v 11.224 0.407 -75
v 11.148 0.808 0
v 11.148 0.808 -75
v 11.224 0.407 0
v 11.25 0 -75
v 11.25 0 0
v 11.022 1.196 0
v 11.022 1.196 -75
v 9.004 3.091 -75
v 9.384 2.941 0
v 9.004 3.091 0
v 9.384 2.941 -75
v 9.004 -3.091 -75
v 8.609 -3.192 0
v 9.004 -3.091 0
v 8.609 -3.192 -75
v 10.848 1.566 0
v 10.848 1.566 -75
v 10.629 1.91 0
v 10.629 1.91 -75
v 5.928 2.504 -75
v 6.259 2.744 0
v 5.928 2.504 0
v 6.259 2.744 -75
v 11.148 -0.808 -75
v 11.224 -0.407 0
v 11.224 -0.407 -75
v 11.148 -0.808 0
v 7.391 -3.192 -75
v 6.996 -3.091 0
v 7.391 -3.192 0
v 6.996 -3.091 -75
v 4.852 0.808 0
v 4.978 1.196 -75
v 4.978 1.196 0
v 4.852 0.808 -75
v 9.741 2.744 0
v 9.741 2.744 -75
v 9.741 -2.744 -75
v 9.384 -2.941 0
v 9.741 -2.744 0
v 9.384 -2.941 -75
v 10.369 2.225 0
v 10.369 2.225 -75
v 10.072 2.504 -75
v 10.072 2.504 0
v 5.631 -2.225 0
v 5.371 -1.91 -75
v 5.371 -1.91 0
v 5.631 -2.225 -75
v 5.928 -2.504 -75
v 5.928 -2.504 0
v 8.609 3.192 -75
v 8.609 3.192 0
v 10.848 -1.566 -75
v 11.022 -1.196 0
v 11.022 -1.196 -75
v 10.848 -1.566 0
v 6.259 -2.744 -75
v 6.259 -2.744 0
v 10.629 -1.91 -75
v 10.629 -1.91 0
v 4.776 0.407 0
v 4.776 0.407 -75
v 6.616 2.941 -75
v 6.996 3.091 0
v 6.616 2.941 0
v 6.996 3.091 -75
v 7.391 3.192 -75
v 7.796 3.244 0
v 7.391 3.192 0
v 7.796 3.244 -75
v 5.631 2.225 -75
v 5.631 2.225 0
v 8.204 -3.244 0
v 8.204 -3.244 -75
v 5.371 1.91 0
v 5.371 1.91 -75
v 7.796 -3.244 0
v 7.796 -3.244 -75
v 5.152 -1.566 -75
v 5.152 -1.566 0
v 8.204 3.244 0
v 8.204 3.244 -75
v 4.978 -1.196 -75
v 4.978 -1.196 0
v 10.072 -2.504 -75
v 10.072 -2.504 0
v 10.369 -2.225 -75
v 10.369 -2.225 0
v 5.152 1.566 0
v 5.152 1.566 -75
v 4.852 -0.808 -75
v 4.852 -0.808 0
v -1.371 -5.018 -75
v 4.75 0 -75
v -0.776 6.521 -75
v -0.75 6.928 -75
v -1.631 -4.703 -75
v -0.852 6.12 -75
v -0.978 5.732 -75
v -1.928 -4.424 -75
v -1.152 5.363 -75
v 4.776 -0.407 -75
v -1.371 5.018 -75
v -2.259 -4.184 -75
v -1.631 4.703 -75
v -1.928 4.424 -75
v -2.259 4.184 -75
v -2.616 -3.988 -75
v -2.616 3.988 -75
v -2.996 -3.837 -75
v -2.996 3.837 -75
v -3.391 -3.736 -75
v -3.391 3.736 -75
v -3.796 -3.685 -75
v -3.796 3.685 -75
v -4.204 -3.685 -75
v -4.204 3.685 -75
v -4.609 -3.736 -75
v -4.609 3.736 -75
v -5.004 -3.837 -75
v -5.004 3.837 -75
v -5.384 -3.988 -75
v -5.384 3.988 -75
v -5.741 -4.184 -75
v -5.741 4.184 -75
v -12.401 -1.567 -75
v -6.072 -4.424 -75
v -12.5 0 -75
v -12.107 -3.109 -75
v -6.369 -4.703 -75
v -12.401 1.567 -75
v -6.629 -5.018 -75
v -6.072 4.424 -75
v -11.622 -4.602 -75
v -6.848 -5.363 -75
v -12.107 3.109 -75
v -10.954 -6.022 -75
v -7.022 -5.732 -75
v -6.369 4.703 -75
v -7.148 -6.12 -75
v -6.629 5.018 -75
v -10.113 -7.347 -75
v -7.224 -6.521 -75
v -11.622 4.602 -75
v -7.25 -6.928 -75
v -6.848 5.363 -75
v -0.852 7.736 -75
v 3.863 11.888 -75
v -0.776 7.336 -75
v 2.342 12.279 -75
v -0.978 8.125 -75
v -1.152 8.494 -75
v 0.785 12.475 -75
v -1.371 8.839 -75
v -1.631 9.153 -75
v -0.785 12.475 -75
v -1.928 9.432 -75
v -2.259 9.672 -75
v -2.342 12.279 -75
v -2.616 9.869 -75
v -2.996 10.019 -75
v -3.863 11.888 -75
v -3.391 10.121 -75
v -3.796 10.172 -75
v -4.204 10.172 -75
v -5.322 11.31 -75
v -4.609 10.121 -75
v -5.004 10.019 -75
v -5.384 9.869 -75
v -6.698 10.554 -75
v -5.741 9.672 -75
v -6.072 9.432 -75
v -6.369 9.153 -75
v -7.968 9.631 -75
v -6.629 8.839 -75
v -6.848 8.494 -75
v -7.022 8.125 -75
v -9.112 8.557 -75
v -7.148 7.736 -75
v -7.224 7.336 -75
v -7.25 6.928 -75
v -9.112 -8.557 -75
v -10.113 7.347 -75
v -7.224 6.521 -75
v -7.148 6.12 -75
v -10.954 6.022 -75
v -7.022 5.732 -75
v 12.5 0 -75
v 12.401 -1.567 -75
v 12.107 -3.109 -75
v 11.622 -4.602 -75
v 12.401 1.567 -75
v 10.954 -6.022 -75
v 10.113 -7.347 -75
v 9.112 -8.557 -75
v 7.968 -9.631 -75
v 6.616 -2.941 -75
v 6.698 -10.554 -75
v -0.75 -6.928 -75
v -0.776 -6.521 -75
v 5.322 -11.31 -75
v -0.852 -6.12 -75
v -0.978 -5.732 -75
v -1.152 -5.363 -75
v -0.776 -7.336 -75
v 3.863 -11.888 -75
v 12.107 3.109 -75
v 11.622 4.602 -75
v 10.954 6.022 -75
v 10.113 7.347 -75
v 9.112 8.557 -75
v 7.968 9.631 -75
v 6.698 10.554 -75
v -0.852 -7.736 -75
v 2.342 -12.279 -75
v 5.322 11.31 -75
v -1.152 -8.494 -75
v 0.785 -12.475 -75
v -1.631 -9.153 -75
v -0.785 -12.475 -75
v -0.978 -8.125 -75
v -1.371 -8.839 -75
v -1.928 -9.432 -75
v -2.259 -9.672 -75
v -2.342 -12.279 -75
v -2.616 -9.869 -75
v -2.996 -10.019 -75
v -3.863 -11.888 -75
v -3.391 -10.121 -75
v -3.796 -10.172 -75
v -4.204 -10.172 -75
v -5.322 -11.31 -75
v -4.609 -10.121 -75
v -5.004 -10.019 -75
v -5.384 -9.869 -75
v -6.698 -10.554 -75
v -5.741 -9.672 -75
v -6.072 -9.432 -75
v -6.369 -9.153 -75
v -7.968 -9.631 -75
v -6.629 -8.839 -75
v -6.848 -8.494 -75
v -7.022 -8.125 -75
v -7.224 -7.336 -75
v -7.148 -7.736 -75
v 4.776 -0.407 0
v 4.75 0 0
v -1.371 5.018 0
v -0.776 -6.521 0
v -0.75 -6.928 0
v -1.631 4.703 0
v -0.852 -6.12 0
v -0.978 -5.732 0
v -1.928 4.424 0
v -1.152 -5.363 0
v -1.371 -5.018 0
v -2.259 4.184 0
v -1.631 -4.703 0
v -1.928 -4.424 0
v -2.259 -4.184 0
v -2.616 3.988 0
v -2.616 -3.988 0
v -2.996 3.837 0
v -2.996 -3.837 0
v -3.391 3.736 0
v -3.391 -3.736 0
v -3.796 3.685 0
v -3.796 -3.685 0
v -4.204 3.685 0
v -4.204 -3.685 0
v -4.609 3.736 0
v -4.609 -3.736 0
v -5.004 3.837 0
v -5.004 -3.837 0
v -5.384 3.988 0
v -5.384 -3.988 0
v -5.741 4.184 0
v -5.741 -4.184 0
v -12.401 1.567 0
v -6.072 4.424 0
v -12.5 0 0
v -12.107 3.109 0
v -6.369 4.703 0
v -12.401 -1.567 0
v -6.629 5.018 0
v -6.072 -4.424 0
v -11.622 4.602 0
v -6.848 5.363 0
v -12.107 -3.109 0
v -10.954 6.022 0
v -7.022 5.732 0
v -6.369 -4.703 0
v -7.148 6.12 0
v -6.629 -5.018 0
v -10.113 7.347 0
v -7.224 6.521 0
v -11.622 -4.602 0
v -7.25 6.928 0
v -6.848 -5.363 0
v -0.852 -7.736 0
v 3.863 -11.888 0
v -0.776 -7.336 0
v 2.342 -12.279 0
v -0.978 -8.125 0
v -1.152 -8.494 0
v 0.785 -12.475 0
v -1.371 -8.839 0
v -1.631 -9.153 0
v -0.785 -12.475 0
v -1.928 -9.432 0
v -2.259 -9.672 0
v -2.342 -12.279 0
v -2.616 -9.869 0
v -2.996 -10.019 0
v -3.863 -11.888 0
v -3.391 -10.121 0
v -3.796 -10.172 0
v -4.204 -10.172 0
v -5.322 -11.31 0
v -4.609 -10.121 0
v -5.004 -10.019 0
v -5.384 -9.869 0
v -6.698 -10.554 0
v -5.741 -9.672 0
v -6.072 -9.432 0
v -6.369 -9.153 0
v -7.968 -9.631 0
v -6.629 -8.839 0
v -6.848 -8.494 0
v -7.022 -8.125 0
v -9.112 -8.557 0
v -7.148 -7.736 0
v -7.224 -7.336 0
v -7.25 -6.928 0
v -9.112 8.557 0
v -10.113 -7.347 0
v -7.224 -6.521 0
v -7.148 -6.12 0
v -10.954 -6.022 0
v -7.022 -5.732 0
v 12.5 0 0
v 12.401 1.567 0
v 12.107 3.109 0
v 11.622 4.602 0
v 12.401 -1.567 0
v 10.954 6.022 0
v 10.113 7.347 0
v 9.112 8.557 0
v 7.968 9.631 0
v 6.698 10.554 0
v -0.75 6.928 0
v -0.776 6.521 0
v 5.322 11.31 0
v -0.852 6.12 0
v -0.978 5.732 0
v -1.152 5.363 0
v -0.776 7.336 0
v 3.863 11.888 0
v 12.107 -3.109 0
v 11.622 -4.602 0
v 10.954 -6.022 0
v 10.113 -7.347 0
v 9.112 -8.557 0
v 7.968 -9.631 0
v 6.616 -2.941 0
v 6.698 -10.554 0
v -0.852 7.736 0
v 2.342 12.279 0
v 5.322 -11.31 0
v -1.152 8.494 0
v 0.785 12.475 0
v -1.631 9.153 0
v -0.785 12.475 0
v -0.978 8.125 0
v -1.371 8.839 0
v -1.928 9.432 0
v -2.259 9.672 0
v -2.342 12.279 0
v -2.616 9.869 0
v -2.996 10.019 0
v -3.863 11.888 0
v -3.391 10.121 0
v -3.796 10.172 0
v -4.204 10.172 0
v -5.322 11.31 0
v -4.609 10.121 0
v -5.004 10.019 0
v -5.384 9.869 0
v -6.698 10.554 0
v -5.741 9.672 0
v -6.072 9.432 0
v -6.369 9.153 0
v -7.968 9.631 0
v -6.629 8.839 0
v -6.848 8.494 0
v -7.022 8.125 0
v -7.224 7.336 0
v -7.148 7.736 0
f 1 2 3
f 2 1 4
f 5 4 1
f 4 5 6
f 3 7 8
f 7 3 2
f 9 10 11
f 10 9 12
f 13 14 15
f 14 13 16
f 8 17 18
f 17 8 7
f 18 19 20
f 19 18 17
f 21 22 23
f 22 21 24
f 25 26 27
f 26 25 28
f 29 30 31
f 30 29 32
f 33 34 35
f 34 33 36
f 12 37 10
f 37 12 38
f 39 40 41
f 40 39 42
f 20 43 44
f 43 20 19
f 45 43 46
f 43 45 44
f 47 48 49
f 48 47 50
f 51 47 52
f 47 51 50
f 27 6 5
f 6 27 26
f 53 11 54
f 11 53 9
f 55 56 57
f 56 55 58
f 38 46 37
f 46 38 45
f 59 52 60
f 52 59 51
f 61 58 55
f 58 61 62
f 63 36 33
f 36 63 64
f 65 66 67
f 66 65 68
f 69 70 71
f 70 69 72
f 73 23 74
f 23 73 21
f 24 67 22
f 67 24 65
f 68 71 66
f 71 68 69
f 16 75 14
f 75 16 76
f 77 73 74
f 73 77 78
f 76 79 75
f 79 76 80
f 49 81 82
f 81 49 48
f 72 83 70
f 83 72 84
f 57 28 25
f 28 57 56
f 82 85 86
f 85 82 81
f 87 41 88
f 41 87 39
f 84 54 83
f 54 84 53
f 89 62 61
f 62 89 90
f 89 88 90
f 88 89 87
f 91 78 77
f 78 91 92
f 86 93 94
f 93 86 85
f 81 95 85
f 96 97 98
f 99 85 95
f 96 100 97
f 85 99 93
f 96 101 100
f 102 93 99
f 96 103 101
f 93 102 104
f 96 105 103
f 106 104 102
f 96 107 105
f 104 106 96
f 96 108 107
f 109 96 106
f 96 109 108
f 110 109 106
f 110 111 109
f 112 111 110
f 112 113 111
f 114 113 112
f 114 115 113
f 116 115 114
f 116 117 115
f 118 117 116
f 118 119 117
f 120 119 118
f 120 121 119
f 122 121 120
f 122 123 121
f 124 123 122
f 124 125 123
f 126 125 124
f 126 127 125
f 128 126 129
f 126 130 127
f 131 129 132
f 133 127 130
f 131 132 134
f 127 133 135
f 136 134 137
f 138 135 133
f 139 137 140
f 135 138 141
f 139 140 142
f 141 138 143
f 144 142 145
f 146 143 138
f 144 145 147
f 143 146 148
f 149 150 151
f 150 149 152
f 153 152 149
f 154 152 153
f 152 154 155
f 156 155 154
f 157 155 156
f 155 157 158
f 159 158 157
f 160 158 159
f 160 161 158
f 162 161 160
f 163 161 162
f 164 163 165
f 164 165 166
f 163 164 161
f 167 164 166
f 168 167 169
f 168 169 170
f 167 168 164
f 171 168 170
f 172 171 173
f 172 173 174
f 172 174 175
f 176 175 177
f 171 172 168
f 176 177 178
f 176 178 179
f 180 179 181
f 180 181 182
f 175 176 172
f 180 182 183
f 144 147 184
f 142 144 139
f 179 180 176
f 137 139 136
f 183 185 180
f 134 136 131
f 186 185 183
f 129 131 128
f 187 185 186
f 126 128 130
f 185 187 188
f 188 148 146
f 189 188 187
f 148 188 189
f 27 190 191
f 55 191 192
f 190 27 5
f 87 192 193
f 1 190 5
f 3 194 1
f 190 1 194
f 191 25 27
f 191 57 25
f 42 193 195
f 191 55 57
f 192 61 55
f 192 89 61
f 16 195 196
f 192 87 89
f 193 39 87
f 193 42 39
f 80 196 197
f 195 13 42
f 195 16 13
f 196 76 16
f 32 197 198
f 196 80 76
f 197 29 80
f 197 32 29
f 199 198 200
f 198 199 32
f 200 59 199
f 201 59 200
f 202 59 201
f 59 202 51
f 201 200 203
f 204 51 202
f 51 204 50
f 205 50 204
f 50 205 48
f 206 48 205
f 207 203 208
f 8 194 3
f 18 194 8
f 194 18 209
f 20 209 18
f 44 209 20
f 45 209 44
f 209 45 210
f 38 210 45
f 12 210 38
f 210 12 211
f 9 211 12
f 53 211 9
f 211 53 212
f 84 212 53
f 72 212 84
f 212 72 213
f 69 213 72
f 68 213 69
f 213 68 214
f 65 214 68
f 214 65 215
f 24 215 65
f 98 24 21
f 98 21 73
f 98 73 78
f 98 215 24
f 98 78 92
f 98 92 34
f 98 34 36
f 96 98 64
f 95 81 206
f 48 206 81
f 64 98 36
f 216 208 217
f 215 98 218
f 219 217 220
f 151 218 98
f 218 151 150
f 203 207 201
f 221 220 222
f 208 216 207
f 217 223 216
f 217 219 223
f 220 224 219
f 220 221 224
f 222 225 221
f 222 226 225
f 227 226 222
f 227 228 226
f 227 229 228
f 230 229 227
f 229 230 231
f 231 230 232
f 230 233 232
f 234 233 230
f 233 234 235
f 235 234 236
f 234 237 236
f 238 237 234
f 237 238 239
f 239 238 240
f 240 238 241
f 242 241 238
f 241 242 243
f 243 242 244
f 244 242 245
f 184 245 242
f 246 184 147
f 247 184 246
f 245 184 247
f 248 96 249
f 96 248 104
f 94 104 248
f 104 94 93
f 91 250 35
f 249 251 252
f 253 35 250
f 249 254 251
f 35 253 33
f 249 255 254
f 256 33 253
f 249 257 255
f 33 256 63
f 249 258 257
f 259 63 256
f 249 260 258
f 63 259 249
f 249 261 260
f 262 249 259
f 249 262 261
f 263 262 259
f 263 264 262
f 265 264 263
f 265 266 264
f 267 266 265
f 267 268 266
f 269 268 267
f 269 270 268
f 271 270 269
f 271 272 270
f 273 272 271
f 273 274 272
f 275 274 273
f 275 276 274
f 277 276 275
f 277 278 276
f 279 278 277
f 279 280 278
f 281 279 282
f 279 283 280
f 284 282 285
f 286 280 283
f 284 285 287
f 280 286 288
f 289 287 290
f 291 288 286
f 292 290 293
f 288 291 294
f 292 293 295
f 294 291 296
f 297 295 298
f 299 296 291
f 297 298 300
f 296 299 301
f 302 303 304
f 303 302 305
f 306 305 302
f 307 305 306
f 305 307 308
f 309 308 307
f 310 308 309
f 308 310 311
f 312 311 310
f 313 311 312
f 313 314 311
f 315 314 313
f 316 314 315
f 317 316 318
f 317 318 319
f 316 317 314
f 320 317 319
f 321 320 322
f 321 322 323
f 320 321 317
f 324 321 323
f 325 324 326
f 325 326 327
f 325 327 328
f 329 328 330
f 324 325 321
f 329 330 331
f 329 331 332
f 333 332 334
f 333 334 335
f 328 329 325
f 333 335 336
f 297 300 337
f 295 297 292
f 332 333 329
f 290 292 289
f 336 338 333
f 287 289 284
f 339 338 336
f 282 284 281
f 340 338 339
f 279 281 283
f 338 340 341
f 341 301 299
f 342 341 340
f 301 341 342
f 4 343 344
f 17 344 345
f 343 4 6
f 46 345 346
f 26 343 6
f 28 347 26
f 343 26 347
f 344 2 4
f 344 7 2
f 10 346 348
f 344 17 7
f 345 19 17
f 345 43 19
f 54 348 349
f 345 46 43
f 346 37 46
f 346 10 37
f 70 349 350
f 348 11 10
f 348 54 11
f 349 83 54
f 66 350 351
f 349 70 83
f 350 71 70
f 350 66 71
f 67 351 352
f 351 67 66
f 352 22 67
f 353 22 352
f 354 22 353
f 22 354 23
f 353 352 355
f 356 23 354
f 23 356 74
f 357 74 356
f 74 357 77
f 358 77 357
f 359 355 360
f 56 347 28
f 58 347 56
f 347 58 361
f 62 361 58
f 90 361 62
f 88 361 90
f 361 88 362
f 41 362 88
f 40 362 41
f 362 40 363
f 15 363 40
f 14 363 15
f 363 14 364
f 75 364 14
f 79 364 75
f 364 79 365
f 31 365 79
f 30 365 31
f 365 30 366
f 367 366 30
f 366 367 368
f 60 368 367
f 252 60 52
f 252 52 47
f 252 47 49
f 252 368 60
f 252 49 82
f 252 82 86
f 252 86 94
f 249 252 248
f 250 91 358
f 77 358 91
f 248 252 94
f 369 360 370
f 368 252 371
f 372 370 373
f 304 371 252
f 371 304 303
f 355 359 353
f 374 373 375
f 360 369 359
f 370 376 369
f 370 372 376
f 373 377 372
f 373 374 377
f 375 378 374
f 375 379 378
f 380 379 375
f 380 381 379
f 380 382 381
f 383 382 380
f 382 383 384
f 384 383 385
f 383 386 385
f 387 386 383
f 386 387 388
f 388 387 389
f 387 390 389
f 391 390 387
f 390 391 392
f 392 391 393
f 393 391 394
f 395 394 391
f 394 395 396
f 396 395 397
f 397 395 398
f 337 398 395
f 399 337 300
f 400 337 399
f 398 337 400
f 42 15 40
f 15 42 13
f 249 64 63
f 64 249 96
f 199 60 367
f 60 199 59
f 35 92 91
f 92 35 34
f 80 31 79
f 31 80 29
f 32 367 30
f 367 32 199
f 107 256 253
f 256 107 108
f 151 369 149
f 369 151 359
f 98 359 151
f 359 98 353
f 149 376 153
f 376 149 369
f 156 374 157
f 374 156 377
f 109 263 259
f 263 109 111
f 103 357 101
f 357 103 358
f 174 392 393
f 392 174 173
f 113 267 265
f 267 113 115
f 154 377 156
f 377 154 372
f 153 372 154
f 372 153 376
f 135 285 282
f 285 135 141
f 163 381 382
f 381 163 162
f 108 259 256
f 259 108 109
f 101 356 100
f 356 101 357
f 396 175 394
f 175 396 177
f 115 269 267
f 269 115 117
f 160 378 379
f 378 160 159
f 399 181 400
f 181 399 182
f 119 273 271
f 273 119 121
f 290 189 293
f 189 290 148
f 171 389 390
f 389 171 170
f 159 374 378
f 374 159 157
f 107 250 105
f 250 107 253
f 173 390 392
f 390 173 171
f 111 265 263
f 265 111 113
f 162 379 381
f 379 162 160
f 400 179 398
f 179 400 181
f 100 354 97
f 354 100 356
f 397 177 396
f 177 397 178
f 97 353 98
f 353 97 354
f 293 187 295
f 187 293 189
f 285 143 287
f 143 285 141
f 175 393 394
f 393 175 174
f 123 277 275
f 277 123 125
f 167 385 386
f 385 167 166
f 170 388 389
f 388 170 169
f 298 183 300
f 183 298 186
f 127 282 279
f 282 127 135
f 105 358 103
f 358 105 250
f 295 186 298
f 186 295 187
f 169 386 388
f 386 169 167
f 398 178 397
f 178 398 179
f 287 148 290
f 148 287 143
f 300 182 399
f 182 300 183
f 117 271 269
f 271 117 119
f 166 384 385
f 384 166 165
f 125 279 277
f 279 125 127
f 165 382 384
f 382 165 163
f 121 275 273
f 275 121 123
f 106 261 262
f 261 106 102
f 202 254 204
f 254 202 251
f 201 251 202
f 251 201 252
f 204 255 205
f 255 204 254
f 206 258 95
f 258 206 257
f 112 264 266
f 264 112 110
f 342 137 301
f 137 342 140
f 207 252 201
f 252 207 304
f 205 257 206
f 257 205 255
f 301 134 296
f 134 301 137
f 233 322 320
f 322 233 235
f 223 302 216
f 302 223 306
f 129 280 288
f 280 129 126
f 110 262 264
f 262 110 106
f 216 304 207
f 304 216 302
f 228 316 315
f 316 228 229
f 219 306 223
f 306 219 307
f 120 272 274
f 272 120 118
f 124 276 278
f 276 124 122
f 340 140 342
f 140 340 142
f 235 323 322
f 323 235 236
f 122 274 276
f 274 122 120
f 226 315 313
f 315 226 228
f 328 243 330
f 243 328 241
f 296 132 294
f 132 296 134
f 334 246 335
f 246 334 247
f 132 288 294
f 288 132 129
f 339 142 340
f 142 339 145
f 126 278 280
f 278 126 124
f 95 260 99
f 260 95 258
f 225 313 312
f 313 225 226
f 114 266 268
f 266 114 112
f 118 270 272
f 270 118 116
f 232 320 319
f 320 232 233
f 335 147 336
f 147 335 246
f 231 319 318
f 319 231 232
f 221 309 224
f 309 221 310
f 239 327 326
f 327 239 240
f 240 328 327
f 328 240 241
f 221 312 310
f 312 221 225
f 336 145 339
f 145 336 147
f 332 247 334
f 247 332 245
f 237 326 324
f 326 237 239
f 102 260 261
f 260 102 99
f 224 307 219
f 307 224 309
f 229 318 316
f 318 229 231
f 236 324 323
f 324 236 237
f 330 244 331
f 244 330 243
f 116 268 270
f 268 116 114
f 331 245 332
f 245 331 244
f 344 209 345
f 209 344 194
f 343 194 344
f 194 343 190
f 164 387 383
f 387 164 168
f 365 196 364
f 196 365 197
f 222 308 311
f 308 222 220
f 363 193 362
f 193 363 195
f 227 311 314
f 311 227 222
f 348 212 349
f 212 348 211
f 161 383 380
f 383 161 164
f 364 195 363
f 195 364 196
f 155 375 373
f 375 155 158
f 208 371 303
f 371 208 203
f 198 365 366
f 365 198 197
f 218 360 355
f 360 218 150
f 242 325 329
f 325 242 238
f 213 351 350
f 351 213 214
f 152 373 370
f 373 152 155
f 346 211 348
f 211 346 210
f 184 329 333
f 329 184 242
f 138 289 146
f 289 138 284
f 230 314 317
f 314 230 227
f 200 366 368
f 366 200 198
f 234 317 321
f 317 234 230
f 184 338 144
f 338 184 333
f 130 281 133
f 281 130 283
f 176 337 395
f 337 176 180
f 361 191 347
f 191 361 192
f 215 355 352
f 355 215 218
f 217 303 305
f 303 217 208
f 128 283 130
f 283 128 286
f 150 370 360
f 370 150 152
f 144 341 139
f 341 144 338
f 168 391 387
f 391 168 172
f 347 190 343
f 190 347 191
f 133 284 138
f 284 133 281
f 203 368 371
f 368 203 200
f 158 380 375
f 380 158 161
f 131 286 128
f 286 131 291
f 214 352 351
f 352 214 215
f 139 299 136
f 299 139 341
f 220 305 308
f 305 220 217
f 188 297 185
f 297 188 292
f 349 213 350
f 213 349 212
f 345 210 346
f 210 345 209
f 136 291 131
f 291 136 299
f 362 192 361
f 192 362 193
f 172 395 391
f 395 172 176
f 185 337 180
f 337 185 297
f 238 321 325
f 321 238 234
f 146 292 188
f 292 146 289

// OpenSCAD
$fn = 50;


difference() {
	union() {
		translate(v = [0, 0, -75.0000000000]) {
			cylinder(h = 75, r = 12.5000000000);
		}
	}
	union() {
		#translate(v = [8.0000000000, 0.0000000000, -75]) {
			cylinder(h = 75, r = 3.2500000000);
		}
		#translate(v = [-4.0000000000, 6.9282032303, -75]) {
			cylinder(h = 75, r = 3.2500000000);
		}
		#translate(v = [-4.0000000000, -6.9282032303, -75]) {
			cylinder(h = 75, r = 3.2500000000);
		}
	}
}
